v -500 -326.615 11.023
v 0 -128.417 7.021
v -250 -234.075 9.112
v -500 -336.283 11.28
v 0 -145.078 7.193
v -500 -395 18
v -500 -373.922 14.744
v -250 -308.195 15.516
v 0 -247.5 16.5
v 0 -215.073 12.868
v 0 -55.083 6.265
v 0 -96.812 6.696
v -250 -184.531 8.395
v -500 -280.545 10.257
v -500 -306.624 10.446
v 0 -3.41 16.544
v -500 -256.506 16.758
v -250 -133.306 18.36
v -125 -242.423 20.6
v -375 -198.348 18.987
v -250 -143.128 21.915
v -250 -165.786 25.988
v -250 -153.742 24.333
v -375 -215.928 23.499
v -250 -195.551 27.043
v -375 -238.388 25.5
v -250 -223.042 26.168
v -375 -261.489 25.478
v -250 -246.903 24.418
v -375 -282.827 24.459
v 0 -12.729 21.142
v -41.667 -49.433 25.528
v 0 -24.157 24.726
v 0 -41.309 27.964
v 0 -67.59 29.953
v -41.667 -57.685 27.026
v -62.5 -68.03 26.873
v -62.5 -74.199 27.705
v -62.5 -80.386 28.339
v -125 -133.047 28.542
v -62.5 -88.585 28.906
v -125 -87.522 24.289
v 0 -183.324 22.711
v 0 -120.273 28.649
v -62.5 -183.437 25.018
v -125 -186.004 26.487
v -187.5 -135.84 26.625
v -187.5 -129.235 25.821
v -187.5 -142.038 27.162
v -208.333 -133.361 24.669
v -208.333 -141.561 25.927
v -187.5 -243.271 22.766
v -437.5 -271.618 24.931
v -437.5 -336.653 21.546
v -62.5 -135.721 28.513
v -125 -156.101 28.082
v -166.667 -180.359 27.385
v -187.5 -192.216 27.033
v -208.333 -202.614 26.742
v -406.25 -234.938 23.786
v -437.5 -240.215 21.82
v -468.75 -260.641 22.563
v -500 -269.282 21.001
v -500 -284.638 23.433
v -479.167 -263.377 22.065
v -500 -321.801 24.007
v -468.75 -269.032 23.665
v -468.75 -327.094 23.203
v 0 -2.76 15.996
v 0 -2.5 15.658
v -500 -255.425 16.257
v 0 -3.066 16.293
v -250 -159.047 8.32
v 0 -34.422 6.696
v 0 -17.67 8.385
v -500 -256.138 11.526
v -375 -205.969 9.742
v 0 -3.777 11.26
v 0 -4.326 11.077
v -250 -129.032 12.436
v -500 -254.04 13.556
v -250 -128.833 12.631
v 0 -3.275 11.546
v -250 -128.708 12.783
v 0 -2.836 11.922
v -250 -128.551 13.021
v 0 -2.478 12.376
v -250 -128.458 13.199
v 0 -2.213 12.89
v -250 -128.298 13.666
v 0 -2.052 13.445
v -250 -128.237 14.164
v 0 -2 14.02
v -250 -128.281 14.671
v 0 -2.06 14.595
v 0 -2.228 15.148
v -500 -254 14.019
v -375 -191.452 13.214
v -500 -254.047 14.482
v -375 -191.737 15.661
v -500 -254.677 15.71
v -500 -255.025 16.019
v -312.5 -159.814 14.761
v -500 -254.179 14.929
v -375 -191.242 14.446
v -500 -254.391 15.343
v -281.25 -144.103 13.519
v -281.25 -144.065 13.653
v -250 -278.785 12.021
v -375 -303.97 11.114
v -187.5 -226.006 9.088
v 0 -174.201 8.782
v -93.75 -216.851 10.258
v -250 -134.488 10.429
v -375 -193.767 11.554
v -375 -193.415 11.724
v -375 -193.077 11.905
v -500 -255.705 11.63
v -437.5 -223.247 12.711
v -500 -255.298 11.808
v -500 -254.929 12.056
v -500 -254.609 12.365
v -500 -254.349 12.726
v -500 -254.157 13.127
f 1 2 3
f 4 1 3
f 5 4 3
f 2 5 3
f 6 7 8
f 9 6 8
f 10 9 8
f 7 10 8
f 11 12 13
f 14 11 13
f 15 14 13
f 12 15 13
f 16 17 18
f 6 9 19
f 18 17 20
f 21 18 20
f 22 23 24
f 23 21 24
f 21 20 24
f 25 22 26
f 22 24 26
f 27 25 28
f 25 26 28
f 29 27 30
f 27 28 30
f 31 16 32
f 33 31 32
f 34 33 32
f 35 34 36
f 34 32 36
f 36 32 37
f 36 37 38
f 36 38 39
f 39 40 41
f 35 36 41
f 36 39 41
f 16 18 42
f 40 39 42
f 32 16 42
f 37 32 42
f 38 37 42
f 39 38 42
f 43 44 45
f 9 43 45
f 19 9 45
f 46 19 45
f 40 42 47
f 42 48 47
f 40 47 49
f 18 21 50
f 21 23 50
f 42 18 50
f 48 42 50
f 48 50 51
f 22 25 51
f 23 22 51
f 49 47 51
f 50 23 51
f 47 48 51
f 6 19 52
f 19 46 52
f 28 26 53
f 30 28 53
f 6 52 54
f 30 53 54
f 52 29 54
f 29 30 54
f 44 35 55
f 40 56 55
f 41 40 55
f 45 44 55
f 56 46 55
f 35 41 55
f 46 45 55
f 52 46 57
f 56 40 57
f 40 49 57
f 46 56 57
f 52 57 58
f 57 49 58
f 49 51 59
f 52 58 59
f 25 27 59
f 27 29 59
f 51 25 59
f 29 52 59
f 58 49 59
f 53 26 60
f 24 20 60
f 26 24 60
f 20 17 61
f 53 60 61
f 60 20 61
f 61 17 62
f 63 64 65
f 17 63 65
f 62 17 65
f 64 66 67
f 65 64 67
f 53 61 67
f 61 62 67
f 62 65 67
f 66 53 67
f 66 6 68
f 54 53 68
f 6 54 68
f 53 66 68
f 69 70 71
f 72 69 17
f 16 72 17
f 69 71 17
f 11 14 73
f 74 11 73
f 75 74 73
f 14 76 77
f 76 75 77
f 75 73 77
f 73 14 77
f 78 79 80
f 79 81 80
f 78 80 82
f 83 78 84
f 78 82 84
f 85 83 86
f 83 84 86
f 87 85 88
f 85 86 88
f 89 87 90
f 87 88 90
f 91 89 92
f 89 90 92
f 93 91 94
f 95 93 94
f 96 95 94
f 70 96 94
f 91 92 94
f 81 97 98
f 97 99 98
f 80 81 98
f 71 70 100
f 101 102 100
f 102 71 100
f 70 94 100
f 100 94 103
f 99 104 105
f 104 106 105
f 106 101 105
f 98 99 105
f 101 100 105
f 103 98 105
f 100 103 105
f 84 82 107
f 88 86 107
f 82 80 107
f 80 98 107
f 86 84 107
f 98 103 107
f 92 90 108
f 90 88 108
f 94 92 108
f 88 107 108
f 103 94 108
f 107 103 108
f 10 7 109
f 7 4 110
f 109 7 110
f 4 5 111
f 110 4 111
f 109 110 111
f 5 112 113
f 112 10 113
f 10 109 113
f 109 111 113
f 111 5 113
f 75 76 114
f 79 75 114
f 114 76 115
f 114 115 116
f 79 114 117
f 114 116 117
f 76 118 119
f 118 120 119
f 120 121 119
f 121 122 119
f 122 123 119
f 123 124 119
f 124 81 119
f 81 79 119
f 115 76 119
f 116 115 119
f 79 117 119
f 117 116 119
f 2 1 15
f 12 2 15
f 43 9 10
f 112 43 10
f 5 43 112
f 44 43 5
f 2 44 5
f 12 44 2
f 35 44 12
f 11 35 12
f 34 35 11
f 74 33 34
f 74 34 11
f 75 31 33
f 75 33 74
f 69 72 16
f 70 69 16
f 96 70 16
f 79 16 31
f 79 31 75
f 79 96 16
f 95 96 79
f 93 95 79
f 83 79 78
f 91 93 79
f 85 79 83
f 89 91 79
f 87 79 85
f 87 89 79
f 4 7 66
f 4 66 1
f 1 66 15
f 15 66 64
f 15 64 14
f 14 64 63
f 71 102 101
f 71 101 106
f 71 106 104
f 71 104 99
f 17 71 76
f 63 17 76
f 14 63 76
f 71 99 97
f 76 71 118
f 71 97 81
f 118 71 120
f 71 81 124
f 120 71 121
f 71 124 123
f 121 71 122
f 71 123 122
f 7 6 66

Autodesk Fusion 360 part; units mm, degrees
sketch "Skizze1" plane through (0, 0, 0) normal (1, 0, 0) x (0, 0, -1)
  line L0 (0, 0) -> (-45, 0) construction
  line L1 (-45, 0) -> (-45, -252.5) construction
  line L2 (-45, -252.5) -> (0, -252.5) construction
  line L3 (0, -252.5) -> (0, 0) construction
  line L4 (-14, -5) -> (-16.5, -247.5) construction
  line L5 (-16.1648, -214.9894) -> (-19.3648, -214.9564) construction
  line L6 (-16.0618, -204.9899) -> (-20.3618, -204.9456) construction
  line L7 (-15.9587, -194.9904) -> (-21.3087, -194.9353) construction
  line L8 (-15.8556, -184.991) -> (-22.1556, -184.926) construction
  line L9 (-15.7525, -174.9915) -> (-23.3525, -174.9131) construction
  line L10 (-15.6494, -164.992) -> (-24.8494, -164.8972) construction
  line L11 (-15.5463, -154.9926) -> (-25.7963, -154.8869) construction
  line L12 (-15.4432, -144.9931) -> (-26.9432, -144.8745) construction
  line L13 (-15.3401, -134.9936) -> (-27.6901, -134.8663) construction
  line L14 (-15.2371, -124.9942) -> (-28.4871, -124.8576) construction
  line L15 (-15.134, -114.9947) -> (-29.134, -114.8504) construction
  line L16 (-15.0309, -104.9952) -> (-29.5309, -104.8457) construction
  line L17 (-14.9278, -94.9957) -> (-29.7278, -94.8432) construction
  line L18 (-14.8247, -84.9963) -> (-29.8247, -84.8416) construction
  line L19 (-14.7216, -74.9968) -> (-30.2216, -74.837) construction
  line L20 (-14.6185, -64.9973) -> (-29.8685, -64.8401) construction
  line L21 (-14.5154, -54.9979) -> (-29.2154, -54.8463) construction
  line L22 (-14.4124, -44.9984) -> (-28.4124, -44.8541) construction
  line L23 (-14.3093, -34.9989) -> (-26.8093, -34.8701) construction
  line L24 (-14.2062, -24.9995) -> (-24.4562, -24.8938) construction
  line L25 (-14.1031, -15) -> (-22.1027, -14.9175) construction
  line L26 (-16.1648, -214.9894) -> (-12.8648, -215.0234) construction
  line L27 (-16.0618, -204.9899) -> (-12.1618, -205.0301) construction
  line L28 (-15.9587, -194.9904) -> (-16.0618, -194.9894) construction
  line L29 (-15.9587, -194.9904) -> (-10.2587, -195.0492) construction
  line L30 (-15.8556, -184.991) -> (-9.7556, -185.0539) construction
  line L31 (-15.7525, -174.9915) -> (-8.8525, -175.0626) construction
  line L32 (-15.6494, -164.992) -> (-8.1494, -165.0693) construction
  line L33 (-15.5463, -154.9926) -> (-7.5463, -155.075) construction
  line L34 (-15.4432, -144.9931) -> (-7.1932, -145.0781) construction
  line L35 (-14.5154, -54.9979) -> (-6.2654, -55.0829) construction
  line L36 (-14.4124, -44.9984) -> (-6.4124, -45.0809) construction
  line L37 (-14.3093, -34.9989) -> (-7.0593, -35.0737) construction
  line L38 (-14.2062, -24.9995) -> (-13.6374, -25.0053) construction
  line L39 (-13.6374, -25.0053) -> (-7.4374, -25.0692) construction
  line L40 (-14.1031, -15) -> (-9.1031, -15.0515) construction
  line L41 (-28.6876, -57.2976) -> (-28.6876, -53.2976) construction
  line L42 (-28.6876, -53.2976) -> (-31.6876, -53.2976) construction
  line L43 (-31.6876, -53.2976) -> (-31.6876, -57.2976) construction
  line L44 (-31.6876, -57.2976) -> (-28.6876, -57.2976) construction
  line L45 (-30, -107) -> (-30, -102) construction
  line L46 (-30, -102) -> (-35, -102) construction
  line L47 (-35, -102) -> (-35, -107) construction
  line L48 (-35, -107) -> (-30, -107) construction
  line L49 (-29, -158) -> (-29, -151) construction
  line L50 (-29, -151) -> (-35, -151) construction
  line L51 (-35, -151) -> (-35, -158) construction
  line L52 (-35, -158) -> (-29, -158) construction
  line L53 (-28, -208) -> (-28, -201) construction
  line L54 (-28, -201) -> (-33, -201) construction
  line L55 (-33, -201) -> (-33, -208) construction
  line L56 (-33, -208) -> (-28, -208) construction
  line L57 (-7.1932, -145.0781) -> (-6.2654, -55.0829)
  spline S0 degree 5 number of poles 115 construction
  spline S1 degree 5 poles (-11.0768, -4.3255) (-10.9783, -4.7523) (-10.7883, -5.6039) (-10.5245, -6.8746) (-10.2108, -8.5556) (-9.8584, -10.6352) (-9.5182, -12.6938) (-9.1666, -14.7331) (-8.792, -16.756) (-8.4052, -18.7668) (-8.032, -20.7708) (-7.7032, -22.7731) (-7.4461, -24.7783) (-7.275, -26.7894) (-7.1808, -28.807) (-7.1379, -30.8297) (-7.1131, -32.8552) (-7.0742, -34.8809) (-6.998, -36.9048) (-6.8801, -38.926) (-6.7304, -40.9447) (-6.5672, -42.9618) (-6.4123, -44.9785) (-6.2859, -46.9958) (-6.2012, -49.0146) (-6.1655, -51.0351) (-6.1789, -52.6532) (-6.2129, -53.8677) (-6.2461, -54.6778) (-6.2654, -55.0829) knots 0 0 0 0 0 0 0.04 0.08 0.12 0.16 0.2 0.24 0.28 0.32 0.36 0.4 0.44 0.48 0.52 0.56 0.6 0.64 0.68 0.72 0.76 0.8 0.84 0.88 0.92 0.96 1 1 1 1 1 1 construction
  spline S2 degree 5 poles (-7.1932, -145.0781) (-7.1963, -145.5182) (-7.2054, -146.3982) (-7.2276, -147.7182) (-7.2744, -149.4781) (-7.3608, -151.6779) (-7.4725, -153.8775) (-7.6045, -156.0768) (-7.748, -158.2758) (-7.8912, -160.4742) (-8.024, -162.672) (-8.1418, -164.8692) (-8.2485, -167.066) (-8.3617, -169.2627) (-8.5041, -171.4599) (-8.6935, -173.6578) (-8.9345, -175.8564) (-9.2071, -178.055) (-9.4661, -180.2521) (-9.6638, -182.4467) (-9.7681, -184.6384) (-9.7802, -186.8281) (-9.7585, -189.0194) (-9.7928, -191.2162) (-9.9673, -193.4214) (-10.3297, -195.6342) (-10.851, -197.8484) (-11.4119, -200.0513) (-11.8781, -202.2292) (-12.1517, -204.3725) (-12.2472, -206.4778) (-12.3273, -208.5587) (-12.4479, -210.6717) (-12.6374, -212.8923) (-12.8897, -215.3048) (-13.1925, -217.9858) (-13.538, -220.9923) (-13.9229, -224.3658) (-14.3471, -228.1343) (-14.8123, -232.3149) (-15.3218, -236.9168) (-15.7677, -240.9379) (-16.1248, -244.1447) (-16.3732, -246.3674) (-16.5, -247.5) knots 0 0 0 0 0 0 0.025 0.05 0.075 0.1 0.125 0.15 0.175 0.2 0.225 0.25 0.275 0.3 0.325 0.35 0.375 0.4 0.425 0.45 0.475 0.5 0.525 0.55 0.575 0.6 0.625 0.65 0.675 0.7 0.725 0.75 0.775 0.8 0.825 0.85 0.875 0.9 0.925 0.95 0.975 1 1 1 1 1 1 construction
  line L58 (-14.8393, -232.6636) -> (-18.1607, -262.3364)
  line L59 (-19.6077, -212.1973) -> (-13.3923, -282.8027)
  line L60 (-11.4552, -194.987) -> (-12.8683, -215.0732)
  line L61 (-1.9731, 19.9133) -> (-31.1155, -26.7343)
  spline S3 degree 5 poles (-16.5443, -3.4105) (-17.3295, -4.6563) (-18.8399, -7.2958) (-20.9256, -11.6992) (-23.3461, -18.3995) (-25.772, -27.8197) (-27.6107, -37.862) (-28.8921, -48.1139) (-29.6745, -58.2875) (-30.0457, -68.2775) (-30.1052, -78.0926) (-29.9503, -87.8132) (-29.6617, -97.5423) (-29.2865, -107.3532) (-28.831, -117.258) (-28.278, -127.2333) (-27.6002, -137.235) (-26.7741, -147.2177) (-25.7961, -157.1525) (-24.6916, -167.0404) (-23.5035, -176.901) (-22.2843, -186.7656) (-21.0868, -196.6688) (-19.9545, -206.6405) (-18.9151, -216.6992) (-17.9841, -226.8553) (-17.3318, -235.0617) (-16.8954, -241.2629) (-16.6279, -245.4175) (-16.5, -247.5) knots 0 0 0 0 0 0 0.04 0.08 0.12 0.16 0.2 0.24 0.28 0.32 0.36 0.4 0.44 0.48 0.52 0.56 0.6 0.64 0.68 0.72 0.76 0.8 0.84 0.88 0.92 0.96 1 1 1 1 1 1
  spline S4 degree 5 poles (-6.2654, -55.0829) (-6.2551, -53.8837) (-6.2433, -51.5008) (-6.2525, -47.9728) (-6.3194, -43.363) (-6.5005, -37.7692) (-6.7888, -32.3606) (-7.1952, -27.1557) (-7.7282, -22.1696) (-8.3881, -17.4024) (-9.1672, -12.8412) (-9.8792, -9.3454) (-10.4601, -6.8044) (-10.8678, -5.1459) (-11.0768, -4.3255) knots 0 0 0 0 0 0 0.1 0.2 0.3 0.4 0.5 0.6 0.7 0.8 0.9 1 1 1 1 1 1
  spline S5 degree 5 poles (-7.1932, -145.0781) (-7.2173, -146.2089) (-7.2752, -148.5017) (-7.3916, -152.0346) (-7.6063, -156.9336) (-7.9754, -163.3751) (-8.4453, -170.1297) (-9.0128, -177.1772) (-9.6682, -184.4695) (-10.3943, -191.927) (-11.1701, -199.4539) (-11.9731, -206.9493) (-12.7822, -214.3188) (-13.5799, -221.4864) (-14.3555, -228.408) (-15.1031, -235.0639) (-15.6771, -240.1721) (-16.0938, -243.8827) (-16.3656, -246.3031) (-16.5, -247.5) knots 0 0 0 0 0 0 0.066667 0.133333 0.2 0.266667 0.333333 0.4 0.466667 0.533333 0.6 0.666667 0.733333 0.8 0.866667 0.933333 1 1 1 1 1 1
  arc A0 (-11.0768, -4.3255) -> (-16.5443, -3.4105) centre (-14, -5) ccw
  line L62 (-6.0886, 13.179) -> (-27, -20)
  point P0 (-14.1031, -15)
  point P1 (-14.2062, -24.9995)
  point P2 (-14.3093, -34.9989)
  point P3 (-14.4124, -44.9984)
  point P4 (-14.5154, -54.9979)
  point P5 (-14.6185, -64.9973)
  point P6 (-14.7216, -74.9968)
  point P7 (-14.8247, -84.9963)
  point P8 (-14.9278, -94.9957)
  point P9 (-15.0309, -104.9952)
  point P10 (-15.134, -114.9947)
  point P11 (-15.2371, -124.9942)
  point P12 (-15.3401, -134.9936)
  point P13 (-15.4432, -144.9931)
  point P14 (-15.5463, -154.9926)
  point P15 (-15.6494, -164.992)
  point P16 (-15.7525, -174.9915)
  point P17 (-15.8556, -184.991)
  point P18 (-15.9587, -194.9904)
  point P19 (-16.0618, -204.9899)
  point P20 (-16.1648, -214.9894)
  point P21 (-28.4124, -44.8541)
  point P22 (-29.7278, -94.8432)
  point P23 (-26.9432, -144.8745)
  point P24 (-21.3087, -194.9353)
  point P25 (-7.4374, -25.0692)
  point P26 (-8.8525, -175.0626)
  point P27 (-12.8683, -215.0732)
  dimension "d1" = 45
  dimension "d2" = 252.5
  dimension "d3" = 14
  dimension "d4" = 5
  dimension "d5" = 16.5
  dimension "d6" = 5
  dimension "d7" = 10
  dimension "d10" = 10
  dimension "d11" = 0
  dimension "d12" = 8
  dimension "d13" = 10.25
  dimension "d14" = 12.5
  dimension "d15" = 14
  dimension "d16" = 14.7
  dimension "d17" = 15.25
  dimension "d18" = 15.5
  dimension "d19" = 10
  dimension "d20" = 10
  dimension "d21" = 10
  dimension "d22" = 10
  dimension "d23" = 15
  dimension "d24" = 14.8
  dimension "d25" = 14.5
  dimension "d26" = 14
  dimension "d27" = 13.25
  dimension "d28" = 12.35
  dimension "d29" = 11.5
  dimension "d30" = 10.25
  dimension "d31" = 9.2
  dimension "d32" = 7.6
  dimension "d33" = 6.3
  dimension "d34" = 5.35
  dimension "d35" = 4.3
  dimension "d36" = 3.2
  dimension "d37" = 32.5124
  dimension "d38" = 5
  dimension "d39" = 6.2
  dimension "d40" = 7.25
  dimension "d41" = 8
  dimension "d42" = 8.25
  dimension "d44" = 8
  dimension "d45" = 7.5
  dimension "d46" = 6.9
  dimension "d47" = 6.1
  dimension "d48" = 5.7
  dimension "d49" = 3.9
  dimension "d50" = 3.3
  dimension "d51" = 6
ref_plane "Arbeitsebene1" through (-500, 0, 0) normal (1, 0, 0) x (0, 1, 0)
sketch "Skizze2" plane through (-500, 0, 0) normal (1, 0, 0) x (0, 0, -1)
  line L0 (0, -250) -> (-45, -250) construction
  line L1 (-45, -250) -> (-45, -400) construction
  line L2 (-45, -400) -> (0, -400) construction
  line L3 (0, -400) -> (0, -250) construction
  line L4 (-45, -252.5) -> (0, -252.5) construction
  line L5 (-45, 0) -> (-45, -252.5) construction
  line L6 (-14, -256.5) -> (-18, -395) construction
  line L7 (-14.2887, -266.4958) -> (-20.3861, -266.3197) construction
  line L8 (-14.5774, -276.4917) -> (-22.3741, -276.2665) construction
  line L9 (-14.8661, -286.4875) -> (-23.3625, -286.2421) construction
  line L10 (-15.1548, -296.4833) -> (-23.8511, -296.2322) construction
  line L11 (-15.4434, -306.4792) -> (-24.3397, -306.2222) construction
  line L12 (-15.7321, -316.475) -> (-24.2286, -316.2296) construction
  line L13 (-16.0208, -326.4708) -> (-24.2174, -326.2341) construction
  line L14 (-16.3095, -336.4667) -> (-23.2066, -336.2675) construction
  line L15 (-16.5982, -346.4625) -> (-21.9959, -346.3066) construction
  line L16 (-16.8869, -356.4583) -> (-21.485, -356.3255) construction
  line L17 (-17.1756, -366.4542) -> (-20.5742, -366.356) construction
  line L18 (-14.2887, -266.4958) -> (-10.2904, -266.6113) construction
  line L19 (-14.5774, -276.4917) -> (-10.2792, -276.6158) construction
  line L20 (-14.8661, -286.4875) -> (-10.168, -286.6232) construction
  line L21 (-15.1548, -296.4833) -> (-10.2568, -296.6248) construction
  line L22 (-15.4434, -306.4792) -> (-10.4455, -306.6235) construction
  line L23 (-16.0208, -326.4708) -> (-11.0229, -326.6152) construction
  line L24 (-16.3095, -336.4667) -> (-11.4115, -336.6081) construction
  line L25 (-16.5982, -346.4625) -> (-12.2, -346.5895) construction
  line L26 (-16.8869, -356.4583) -> (-12.6886, -356.5796) construction
  line L27 (-17.1756, -366.4542) -> (-13.5771, -366.5581) construction
  line L28 (-10.4455, -306.6235) -> (-11.0229, -326.6152)
  spline S0 degree 5 poles (-10.4455, -306.6235) (-10.4397, -306.2212) (-10.4275, -305.4166) (-10.4081, -304.2099) (-10.3797, -302.6013) (-10.3405, -300.5911) (-10.2983, -298.5814) (-10.2551, -296.572) (-10.2142, -294.5626) (-10.1803, -292.5529) (-10.1586, -290.5424) (-10.1531, -288.5309) (-10.1653, -286.5183) (-10.1926, -284.5049) (-10.2276, -282.4917) (-10.26, -280.4796) (-10.2805, -278.4694) (-10.2831, -276.4614) (-10.268, -274.4553) (-10.2445, -272.4492) (-10.2275, -270.441) (-10.2347, -268.4278) (-10.2839, -266.4071) (-10.39, -264.3768) (-10.5618, -262.3355) (-10.8044, -260.2826) (-11.0567, -258.6307) (-11.2788, -257.3864) (-11.4414, -256.5545) (-11.5264, -256.1379) knots 0 0 0 0 0 0 0.04 0.08 0.12 0.16 0.2 0.24 0.28 0.32 0.36 0.4 0.44 0.48 0.52 0.56 0.6 0.64 0.68 0.72 0.76 0.8 0.84 0.88 0.92 0.96 1 1 1 1 1 1 construction
  spline S1 degree 5 poles (-18, -395) (-17.824, -393.9501) (-17.4795, -391.8887) (-16.9855, -388.9118) (-16.3722, -385.1733) (-15.6819, -380.8864) (-15.0683, -376.9846) (-14.5317, -373.4605) (-14.0713, -370.2977) (-13.685, -367.4665) (-13.3693, -364.9213) (-13.1182, -362.5945) (-12.9236, -360.4035) (-12.775, -358.2666) (-12.66, -356.1148) (-12.5638, -353.9076) (-12.4703, -351.6415) (-12.3642, -349.3347) (-12.2344, -347.0158) (-12.076, -344.7115) (-11.8938, -342.4332) (-11.7, -340.1788) (-11.5097, -337.9389) (-11.3387, -335.7009) (-11.1986, -333.4543) (-11.0959, -331.1935) (-11.0461, -329.3711) (-11.0273, -327.9963) (-11.023, -327.0761) (-11.0229, -326.6152) knots 0 0 0 0 0 0 0.04 0.08 0.12 0.16 0.2 0.24 0.28 0.32 0.36 0.4 0.44 0.48 0.52 0.56 0.6 0.64 0.68 0.72 0.76 0.8 0.84 0.88 0.92 0.96 1 1 1 1 1 1 construction
  spline S2 degree 5 number of poles 65 construction
  spline S3 degree 5 poles (-18, -395) (-18.2218, -392.7777) (-18.656, -388.3998) (-19.2791, -382.0328) (-20.0534, -373.9448) (-20.9254, -364.5089) (-21.7, -355.7454) (-22.3752, -347.638) (-22.9502, -340.146) (-23.4249, -333.1961) (-23.8017, -326.6673) (-24.0843, -320.3979) (-24.2736, -314.2218) (-24.364, -307.9989) (-24.3407, -301.6448) (-24.1746, -295.1699) (-23.8267, -288.6629) (-23.2564, -282.2524) (-22.4278, -276.0771) (-21.3179, -270.2524) (-19.924, -264.8391) (-18.5885, -260.8559) (-17.4681, -258.0646) (-16.6693, -256.2902) (-16.2569, -255.4247) knots 0 0 0 0 0 0 0.05 0.1 0.15 0.2 0.25 0.3 0.35 0.4 0.45 0.5 0.55 0.6 0.65 0.7 0.75 0.8 0.85 0.9 0.95 1 1 1 1 1 1
  spline S4 degree 5 poles (-18, -395) (-17.7408, -393.4753) (-17.2324, -390.4393) (-16.5004, -385.9252) (-15.5864, -379.9877) (-14.5544, -372.7107) (-13.6437, -365.5929) (-12.8658, -358.6493) (-12.2295, -351.8914) (-11.7334, -345.3172) (-11.3683, -338.915) (-11.1734, -333.9207) (-11.0785, -330.2422) (-11.0377, -327.8193) (-11.0229, -326.6152) knots 0 0 0 0 0 0 0.1 0.2 0.3 0.4 0.5 0.6 0.7 0.8 0.9 1 1 1 1 1 1
  spline S5 degree 5 poles (-10.4455, -306.6235) (-10.4316, -305.4322) (-10.4048, -303.0646) (-10.3672, -299.5583) (-10.3227, -294.9752) (-10.2785, -289.4103) (-10.2514, -284.0265) (-10.2519, -278.8427) (-10.2967, -273.8752) (-10.4111, -269.1266) (-10.6265, -264.5872) (-10.9054, -261.1137) (-11.1865, -258.5933) (-11.4075, -256.9502) (-11.5264, -256.1379) knots 0 0 0 0 0 0 0.1 0.2 0.3 0.4 0.5 0.6 0.7 0.8 0.9 1 1 1 1 1 1
  arc A0 (-11.5264, -256.1379) -> (-16.2569, -255.4247) centre (-14, -256.5) ccw
  point P0 (-14, -256.5)
  point P1 (-14.2887, -266.4958)
  point P2 (-14.2887, -266.4958)
  point P3 (-14.2887, -266.4958)
  point P4 (-14.5774, -276.4917)
  point P5 (-14.5774, -276.4917)
  point P6 (-14.5774, -276.4917)
  point P7 (-14.8661, -286.4875)
  point P8 (-14.8661, -286.4875)
  point P9 (-14.8661, -286.4875)
  point P10 (-15.1548, -296.4833)
  point P11 (-15.1548, -296.4833)
  point P12 (-15.1548, -296.4833)
  point P13 (-15.4434, -306.4792)
  point P14 (-15.4434, -306.4792)
  point P15 (-15.4434, -306.4792)
  point P16 (-15.7321, -316.475)
  point P17 (-15.7321, -316.475)
  point P18 (-15.7321, -316.475)
  point P19 (-16.0208, -326.4708)
  point P20 (-16.0208, -326.4708)
  point P21 (-16.0208, -326.4708)
  point P22 (-16.3095, -336.4667)
  point P23 (-16.3095, -336.4667)
  point P24 (-16.3095, -336.4667)
  point P25 (-16.5982, -346.4625)
  point P26 (-16.5982, -346.4625)
  point P27 (-16.5982, -346.4625)
  point P28 (-16.8869, -356.4583)
  point P29 (-16.8869, -356.4583)
  point P30 (-16.8869, -356.4583)
  point P31 (-17.1756, -366.4542)
  point P32 (-17.1756, -366.4542)
  point P33 (-17.1756, -366.4542)
  point P34 (-23.2066, -336.2675)
  point P35 (-24.3397, -306.2222)
  point P36 (-22.3741, -276.2665)
  point P37 (-12.6886, -356.5796)
  point P38 (-10.2792, -276.6158)
  dimension "d53" = 150
  dimension "d54" = 250
  dimension "d55" = 14
  dimension "d56" = 4
  dimension "d57" = 18
  dimension "d58" = 5
  dimension "d59" = 5
  dimension "d62" = 10
  dimension "d63" = 0
  dimension "d65" = 6.1
  dimension "d66" = 7.8
  dimension "d67" = 8.5
  dimension "d68" = 8.7
  dimension "d69" = 8.9
  dimension "d70" = 8.5
  dimension "d71" = 8.2
  dimension "d72" = 6.9
  dimension "d73" = 5.4
  dimension "d74" = 4.6
  dimension "d75" = 3.4
  dimension "d76" = 4
  dimension "d77" = 4.3
  dimension "d78" = 4.7
  dimension "d79" = 4.9
  dimension "d80" = 5
  dimension "d82" = 4.9
  dimension "d83" = 4.4
  dimension "d84" = 4.2
  dimension "d85" = 3.6
loft "Erhebung1" add profiles "Skizze1", "Skizze2" section 1 section 2
